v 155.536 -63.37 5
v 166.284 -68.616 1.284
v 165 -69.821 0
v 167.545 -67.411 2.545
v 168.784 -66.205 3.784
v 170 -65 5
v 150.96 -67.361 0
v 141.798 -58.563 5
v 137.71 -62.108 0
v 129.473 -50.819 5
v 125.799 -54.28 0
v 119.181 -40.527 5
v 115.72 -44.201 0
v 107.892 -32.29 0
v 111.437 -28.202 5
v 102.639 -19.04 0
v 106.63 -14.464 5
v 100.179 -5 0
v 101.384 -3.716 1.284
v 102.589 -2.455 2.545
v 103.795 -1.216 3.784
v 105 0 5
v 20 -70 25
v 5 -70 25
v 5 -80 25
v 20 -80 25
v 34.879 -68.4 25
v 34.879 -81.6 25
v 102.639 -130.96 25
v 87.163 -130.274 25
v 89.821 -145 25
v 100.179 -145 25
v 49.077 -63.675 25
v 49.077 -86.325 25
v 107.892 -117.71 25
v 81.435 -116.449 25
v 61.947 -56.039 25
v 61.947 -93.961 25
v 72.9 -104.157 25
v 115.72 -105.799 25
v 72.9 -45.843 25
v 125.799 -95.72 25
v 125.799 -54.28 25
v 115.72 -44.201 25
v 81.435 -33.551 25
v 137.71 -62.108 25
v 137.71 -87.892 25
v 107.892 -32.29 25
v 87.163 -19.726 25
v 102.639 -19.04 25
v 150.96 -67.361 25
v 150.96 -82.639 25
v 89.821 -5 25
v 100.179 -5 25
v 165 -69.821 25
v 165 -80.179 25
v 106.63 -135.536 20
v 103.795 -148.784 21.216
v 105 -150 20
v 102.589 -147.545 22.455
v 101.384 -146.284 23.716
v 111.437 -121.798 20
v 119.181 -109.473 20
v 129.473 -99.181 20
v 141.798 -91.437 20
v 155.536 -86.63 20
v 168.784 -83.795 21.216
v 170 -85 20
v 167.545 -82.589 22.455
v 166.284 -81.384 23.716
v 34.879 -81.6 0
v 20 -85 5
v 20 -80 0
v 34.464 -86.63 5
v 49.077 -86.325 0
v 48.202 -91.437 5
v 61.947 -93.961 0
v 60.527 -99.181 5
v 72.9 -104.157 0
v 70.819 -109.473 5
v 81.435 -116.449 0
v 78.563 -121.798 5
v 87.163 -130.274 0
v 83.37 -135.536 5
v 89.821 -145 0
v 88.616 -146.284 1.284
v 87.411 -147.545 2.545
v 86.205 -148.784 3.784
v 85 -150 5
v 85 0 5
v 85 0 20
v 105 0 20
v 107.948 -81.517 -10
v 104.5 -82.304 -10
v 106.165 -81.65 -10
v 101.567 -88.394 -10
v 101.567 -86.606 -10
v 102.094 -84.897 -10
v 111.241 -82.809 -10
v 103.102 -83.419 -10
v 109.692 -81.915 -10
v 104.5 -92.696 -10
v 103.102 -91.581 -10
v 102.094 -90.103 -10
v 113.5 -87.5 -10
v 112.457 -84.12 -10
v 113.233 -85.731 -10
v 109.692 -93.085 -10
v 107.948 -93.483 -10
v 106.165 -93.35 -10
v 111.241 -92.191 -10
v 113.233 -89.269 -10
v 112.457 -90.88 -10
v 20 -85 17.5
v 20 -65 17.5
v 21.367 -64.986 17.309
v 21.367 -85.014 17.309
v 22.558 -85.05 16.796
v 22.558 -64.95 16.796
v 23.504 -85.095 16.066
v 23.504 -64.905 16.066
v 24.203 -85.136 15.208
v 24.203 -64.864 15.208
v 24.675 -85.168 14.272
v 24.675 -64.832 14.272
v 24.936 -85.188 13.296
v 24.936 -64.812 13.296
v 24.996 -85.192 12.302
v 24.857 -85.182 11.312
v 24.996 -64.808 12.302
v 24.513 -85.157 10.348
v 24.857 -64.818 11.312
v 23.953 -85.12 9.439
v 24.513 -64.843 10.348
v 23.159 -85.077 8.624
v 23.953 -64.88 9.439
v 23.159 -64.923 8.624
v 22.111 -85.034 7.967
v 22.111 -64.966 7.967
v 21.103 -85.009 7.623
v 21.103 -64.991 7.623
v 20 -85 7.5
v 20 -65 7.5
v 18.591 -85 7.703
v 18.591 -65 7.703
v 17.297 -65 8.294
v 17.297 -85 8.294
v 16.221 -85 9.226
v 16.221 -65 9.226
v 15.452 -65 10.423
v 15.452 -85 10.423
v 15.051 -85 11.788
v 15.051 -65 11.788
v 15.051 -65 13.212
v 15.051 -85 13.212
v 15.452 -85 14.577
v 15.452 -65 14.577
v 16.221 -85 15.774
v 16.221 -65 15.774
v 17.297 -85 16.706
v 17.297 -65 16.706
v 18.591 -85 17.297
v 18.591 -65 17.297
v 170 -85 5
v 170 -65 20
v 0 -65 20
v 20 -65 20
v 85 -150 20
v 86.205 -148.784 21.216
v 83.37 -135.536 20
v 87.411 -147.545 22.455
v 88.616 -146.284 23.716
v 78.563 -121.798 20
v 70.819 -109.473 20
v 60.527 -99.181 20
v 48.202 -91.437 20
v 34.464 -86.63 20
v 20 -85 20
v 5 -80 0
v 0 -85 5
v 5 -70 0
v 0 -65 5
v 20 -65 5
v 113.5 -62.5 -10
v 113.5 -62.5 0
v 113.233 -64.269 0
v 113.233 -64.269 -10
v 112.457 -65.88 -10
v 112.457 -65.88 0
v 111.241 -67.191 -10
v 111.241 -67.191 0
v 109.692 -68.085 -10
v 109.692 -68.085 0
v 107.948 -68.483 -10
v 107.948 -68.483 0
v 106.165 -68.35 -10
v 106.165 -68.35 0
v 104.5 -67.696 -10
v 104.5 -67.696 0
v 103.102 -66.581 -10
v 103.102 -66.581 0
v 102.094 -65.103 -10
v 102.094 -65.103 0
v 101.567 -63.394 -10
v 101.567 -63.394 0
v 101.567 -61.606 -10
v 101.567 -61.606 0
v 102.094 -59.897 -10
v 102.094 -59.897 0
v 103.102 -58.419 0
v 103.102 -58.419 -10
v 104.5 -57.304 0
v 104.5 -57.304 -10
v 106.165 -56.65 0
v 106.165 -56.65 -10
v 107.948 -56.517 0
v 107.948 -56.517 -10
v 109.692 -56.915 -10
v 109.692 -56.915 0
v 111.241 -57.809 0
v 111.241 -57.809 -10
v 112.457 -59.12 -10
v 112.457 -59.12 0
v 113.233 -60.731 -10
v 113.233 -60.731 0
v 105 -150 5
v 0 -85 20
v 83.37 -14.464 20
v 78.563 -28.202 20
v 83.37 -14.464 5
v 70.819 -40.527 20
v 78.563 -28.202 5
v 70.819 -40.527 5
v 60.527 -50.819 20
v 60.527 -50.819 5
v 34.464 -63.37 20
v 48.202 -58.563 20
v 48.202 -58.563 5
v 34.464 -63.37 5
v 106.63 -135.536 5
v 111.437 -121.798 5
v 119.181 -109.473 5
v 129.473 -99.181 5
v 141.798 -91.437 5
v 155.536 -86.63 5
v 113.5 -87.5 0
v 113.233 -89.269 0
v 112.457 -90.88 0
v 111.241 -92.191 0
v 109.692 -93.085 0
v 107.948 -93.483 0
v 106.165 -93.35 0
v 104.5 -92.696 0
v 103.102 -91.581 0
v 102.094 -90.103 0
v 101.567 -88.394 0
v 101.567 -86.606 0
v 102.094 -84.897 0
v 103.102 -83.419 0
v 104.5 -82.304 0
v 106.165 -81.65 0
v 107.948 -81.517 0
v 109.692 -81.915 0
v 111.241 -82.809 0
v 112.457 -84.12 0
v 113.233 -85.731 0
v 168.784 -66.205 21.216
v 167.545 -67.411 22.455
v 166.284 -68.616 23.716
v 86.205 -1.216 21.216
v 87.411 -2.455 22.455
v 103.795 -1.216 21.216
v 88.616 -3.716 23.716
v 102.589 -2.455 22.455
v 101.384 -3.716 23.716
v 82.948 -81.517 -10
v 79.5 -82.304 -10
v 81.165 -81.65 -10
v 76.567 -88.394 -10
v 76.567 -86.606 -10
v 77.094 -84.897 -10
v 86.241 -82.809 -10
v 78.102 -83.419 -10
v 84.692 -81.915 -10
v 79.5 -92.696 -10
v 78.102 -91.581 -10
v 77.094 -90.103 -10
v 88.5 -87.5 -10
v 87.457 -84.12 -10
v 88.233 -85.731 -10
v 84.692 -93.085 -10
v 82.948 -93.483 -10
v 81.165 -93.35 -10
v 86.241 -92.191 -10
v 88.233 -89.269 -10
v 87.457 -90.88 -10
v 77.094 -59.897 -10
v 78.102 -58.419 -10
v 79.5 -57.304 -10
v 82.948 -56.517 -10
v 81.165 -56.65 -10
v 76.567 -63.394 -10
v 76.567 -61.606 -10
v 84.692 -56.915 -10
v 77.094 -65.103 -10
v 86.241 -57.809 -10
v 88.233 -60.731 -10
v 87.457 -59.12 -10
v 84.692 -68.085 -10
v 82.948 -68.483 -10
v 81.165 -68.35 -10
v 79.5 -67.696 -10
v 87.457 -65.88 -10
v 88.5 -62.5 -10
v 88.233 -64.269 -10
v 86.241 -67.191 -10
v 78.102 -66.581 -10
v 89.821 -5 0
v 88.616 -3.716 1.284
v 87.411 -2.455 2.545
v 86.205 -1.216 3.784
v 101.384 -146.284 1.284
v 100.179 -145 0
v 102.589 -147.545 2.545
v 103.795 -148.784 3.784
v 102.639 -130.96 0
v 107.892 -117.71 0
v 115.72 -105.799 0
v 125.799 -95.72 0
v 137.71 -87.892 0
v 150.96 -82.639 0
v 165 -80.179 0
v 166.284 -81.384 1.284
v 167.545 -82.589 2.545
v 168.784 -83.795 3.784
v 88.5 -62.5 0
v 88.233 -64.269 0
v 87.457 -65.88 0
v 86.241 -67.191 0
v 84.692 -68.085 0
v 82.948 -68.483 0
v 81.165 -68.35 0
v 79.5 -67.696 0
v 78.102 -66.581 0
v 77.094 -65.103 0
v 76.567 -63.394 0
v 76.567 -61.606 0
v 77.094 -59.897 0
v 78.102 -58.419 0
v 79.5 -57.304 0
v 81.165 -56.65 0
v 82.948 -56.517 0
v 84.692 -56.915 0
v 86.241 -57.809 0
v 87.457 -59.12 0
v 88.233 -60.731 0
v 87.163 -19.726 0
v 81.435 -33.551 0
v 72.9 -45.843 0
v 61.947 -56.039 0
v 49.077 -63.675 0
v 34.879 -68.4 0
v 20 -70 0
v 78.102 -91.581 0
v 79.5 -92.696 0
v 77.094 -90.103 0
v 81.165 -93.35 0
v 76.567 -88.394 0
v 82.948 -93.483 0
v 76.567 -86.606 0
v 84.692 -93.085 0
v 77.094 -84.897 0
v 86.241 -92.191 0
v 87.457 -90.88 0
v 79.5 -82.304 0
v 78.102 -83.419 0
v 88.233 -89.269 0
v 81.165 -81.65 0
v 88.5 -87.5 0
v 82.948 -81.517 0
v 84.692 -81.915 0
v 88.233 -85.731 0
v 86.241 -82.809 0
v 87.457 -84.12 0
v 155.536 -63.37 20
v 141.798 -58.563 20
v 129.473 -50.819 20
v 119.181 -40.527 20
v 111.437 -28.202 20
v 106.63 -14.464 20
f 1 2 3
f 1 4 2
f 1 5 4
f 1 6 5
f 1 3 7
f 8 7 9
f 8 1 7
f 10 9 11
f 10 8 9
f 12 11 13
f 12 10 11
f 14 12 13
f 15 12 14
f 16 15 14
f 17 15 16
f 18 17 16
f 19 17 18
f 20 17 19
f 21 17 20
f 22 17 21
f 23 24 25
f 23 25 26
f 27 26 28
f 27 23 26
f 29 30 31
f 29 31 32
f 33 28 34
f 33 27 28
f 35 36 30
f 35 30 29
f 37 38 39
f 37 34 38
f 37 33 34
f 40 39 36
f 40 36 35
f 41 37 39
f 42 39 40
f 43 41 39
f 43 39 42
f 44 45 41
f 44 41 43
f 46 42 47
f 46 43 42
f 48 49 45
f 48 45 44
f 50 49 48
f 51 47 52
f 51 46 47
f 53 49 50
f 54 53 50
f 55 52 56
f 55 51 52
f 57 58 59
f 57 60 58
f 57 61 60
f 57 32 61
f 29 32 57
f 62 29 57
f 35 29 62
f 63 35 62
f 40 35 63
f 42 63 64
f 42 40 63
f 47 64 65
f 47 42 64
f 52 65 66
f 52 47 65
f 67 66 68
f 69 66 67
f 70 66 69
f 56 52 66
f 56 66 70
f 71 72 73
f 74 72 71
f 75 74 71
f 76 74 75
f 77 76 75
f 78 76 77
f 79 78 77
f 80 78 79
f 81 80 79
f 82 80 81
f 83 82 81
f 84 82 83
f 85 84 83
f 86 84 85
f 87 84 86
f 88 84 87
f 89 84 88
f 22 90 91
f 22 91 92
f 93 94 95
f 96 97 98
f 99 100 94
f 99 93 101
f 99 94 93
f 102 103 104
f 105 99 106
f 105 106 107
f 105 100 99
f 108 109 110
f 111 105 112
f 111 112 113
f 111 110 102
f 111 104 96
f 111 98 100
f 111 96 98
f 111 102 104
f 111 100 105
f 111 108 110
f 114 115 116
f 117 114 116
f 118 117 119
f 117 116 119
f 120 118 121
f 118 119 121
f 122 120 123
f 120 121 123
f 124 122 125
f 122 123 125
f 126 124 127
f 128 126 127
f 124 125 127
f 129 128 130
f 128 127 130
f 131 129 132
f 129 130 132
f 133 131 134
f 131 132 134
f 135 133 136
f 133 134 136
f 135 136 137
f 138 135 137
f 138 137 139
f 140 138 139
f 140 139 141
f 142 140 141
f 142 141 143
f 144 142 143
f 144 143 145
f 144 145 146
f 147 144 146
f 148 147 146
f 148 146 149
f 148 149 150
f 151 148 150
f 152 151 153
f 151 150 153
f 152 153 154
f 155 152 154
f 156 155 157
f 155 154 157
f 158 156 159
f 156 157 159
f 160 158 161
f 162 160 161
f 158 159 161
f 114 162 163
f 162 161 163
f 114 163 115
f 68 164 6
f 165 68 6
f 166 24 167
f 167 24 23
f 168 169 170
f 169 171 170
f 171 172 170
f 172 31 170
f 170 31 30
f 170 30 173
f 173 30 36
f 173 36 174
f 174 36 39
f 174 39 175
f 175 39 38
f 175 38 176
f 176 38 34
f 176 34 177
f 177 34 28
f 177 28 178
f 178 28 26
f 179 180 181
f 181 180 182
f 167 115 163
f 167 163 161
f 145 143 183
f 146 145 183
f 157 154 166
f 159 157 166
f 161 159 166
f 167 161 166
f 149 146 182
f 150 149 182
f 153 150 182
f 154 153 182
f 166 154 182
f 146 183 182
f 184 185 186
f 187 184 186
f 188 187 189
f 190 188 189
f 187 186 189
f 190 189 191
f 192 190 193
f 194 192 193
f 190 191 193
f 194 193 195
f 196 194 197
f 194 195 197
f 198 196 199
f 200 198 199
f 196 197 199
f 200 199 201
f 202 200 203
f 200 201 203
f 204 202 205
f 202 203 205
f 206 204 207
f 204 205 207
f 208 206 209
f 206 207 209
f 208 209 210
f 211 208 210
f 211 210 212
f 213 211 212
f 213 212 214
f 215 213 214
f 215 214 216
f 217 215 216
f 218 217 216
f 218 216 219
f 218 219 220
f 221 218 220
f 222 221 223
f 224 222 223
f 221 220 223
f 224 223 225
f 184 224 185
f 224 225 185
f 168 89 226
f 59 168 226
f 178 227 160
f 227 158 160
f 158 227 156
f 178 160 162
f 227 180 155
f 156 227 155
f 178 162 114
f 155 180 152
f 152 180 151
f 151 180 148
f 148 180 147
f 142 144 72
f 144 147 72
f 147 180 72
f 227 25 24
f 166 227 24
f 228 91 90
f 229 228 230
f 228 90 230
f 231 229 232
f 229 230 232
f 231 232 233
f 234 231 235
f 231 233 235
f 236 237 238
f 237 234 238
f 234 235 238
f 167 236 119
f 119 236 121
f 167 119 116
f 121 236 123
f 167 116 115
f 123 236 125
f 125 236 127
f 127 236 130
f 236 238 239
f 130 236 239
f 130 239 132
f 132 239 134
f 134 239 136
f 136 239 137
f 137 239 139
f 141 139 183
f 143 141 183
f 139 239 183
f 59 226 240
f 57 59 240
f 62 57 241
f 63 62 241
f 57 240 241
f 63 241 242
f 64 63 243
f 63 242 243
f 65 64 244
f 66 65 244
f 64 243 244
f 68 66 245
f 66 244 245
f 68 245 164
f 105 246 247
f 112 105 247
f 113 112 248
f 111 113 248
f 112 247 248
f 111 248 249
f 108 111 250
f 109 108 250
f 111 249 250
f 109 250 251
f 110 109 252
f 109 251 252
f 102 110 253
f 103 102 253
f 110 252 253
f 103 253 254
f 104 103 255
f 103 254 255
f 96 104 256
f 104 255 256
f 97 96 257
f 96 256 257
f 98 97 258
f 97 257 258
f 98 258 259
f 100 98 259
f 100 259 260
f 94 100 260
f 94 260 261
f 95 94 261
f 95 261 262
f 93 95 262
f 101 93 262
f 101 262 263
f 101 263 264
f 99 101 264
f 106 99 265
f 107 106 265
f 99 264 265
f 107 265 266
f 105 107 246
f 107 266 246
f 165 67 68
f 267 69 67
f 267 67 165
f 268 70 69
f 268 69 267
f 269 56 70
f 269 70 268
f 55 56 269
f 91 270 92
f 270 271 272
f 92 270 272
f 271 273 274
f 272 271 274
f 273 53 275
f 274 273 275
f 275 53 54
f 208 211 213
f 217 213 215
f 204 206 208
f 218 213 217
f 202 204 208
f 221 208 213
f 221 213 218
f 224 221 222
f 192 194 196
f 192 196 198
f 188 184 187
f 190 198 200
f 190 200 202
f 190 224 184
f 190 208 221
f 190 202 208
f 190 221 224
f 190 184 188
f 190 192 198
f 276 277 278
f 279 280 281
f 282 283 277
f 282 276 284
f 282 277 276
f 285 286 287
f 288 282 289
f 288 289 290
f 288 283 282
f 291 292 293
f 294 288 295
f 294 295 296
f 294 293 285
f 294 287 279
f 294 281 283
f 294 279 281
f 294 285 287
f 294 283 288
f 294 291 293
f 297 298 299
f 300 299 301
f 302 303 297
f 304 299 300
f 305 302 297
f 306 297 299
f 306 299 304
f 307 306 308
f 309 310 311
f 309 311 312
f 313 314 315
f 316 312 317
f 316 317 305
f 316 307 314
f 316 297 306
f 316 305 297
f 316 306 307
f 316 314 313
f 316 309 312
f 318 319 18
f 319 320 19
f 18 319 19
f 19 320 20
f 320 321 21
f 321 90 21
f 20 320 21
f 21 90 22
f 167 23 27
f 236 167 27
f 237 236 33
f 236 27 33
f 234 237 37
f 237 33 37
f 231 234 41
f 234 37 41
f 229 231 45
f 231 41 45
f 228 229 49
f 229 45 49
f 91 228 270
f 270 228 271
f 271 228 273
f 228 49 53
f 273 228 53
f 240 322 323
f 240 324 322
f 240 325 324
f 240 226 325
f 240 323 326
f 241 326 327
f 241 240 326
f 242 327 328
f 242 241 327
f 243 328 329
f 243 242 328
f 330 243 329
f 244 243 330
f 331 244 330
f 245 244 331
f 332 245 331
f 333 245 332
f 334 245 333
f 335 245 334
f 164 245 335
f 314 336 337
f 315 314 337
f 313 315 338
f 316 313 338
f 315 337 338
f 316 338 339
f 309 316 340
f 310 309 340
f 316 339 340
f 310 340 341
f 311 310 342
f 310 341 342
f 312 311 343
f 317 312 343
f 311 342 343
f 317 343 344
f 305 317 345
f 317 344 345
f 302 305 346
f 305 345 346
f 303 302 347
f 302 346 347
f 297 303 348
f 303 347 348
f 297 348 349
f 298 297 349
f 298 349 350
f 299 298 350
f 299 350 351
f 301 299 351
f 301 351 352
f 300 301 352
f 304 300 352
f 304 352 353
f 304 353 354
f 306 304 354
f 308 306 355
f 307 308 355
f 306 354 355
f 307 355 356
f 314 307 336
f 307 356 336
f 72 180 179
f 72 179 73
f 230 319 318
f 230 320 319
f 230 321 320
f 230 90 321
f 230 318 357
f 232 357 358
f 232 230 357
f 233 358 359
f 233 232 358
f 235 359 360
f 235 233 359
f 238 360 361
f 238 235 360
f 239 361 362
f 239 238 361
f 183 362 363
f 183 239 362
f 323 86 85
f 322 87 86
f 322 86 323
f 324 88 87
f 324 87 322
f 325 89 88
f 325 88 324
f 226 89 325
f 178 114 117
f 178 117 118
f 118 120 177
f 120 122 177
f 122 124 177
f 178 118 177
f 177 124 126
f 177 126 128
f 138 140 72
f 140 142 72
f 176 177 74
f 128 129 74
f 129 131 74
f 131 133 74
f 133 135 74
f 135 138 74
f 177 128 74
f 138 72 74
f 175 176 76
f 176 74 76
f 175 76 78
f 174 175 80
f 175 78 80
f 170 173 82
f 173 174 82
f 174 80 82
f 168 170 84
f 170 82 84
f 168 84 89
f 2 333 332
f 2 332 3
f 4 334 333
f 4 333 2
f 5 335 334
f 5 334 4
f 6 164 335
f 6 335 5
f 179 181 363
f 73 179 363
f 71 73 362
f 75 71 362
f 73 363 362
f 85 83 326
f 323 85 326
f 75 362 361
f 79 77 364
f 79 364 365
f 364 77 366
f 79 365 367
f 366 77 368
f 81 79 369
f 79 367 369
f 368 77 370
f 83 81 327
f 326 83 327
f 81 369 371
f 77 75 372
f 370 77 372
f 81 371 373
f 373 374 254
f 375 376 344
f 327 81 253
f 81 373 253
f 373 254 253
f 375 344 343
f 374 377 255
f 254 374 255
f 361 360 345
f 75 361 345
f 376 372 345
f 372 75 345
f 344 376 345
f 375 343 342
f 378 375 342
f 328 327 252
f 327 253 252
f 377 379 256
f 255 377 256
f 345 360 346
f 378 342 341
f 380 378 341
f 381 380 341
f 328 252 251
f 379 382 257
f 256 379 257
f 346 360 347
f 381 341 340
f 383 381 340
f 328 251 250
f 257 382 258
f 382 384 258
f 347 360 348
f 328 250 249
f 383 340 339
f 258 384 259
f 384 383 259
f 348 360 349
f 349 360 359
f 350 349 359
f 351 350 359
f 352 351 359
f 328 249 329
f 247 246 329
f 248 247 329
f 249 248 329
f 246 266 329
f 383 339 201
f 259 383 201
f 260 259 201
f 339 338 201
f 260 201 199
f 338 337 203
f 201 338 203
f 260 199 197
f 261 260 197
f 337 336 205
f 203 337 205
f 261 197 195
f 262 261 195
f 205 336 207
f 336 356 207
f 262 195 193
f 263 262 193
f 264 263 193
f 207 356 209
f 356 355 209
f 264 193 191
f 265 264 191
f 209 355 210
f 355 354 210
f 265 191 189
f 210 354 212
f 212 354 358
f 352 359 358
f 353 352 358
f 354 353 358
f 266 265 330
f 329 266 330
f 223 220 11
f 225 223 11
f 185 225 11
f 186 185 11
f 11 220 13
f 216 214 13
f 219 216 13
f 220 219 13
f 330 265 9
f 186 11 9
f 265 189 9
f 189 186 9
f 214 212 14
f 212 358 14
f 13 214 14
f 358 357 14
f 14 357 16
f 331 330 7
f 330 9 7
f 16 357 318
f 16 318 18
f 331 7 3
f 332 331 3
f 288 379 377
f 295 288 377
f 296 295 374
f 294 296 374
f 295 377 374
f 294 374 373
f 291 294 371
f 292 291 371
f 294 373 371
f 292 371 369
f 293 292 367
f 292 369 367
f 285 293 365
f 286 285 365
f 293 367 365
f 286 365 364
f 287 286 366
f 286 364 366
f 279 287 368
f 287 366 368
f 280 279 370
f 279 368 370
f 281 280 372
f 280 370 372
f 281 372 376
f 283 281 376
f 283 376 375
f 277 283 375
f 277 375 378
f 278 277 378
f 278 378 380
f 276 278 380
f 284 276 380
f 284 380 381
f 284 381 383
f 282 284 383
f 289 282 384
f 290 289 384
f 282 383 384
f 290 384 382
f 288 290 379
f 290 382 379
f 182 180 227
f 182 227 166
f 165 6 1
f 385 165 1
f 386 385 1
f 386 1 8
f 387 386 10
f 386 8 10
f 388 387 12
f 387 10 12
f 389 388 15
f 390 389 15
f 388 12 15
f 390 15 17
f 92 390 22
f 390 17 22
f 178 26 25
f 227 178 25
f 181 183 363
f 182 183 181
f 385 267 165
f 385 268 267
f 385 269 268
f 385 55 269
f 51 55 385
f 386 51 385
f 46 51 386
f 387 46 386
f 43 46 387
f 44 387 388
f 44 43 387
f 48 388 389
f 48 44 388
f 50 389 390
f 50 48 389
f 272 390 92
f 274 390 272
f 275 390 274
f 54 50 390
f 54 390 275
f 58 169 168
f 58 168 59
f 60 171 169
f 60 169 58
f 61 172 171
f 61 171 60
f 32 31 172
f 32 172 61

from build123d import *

# Parameters (mm, degrees)
SKETCH_1_W          = 170
SKETCH_1_H          = 150
EXTRUDE_1_DEPTH     = 25
CUT_EXTRUDE_1_DEPTH = 50
CHAMFER_2_SIZE      = 5
SKETCH_7_R          = 6
EXTRUDE_4_DEPTH     = 10
CHAMFER_4_SIZE      = 5
SKETCH_8_R          = 5
CUT_EXTRUDE_2_DEPTH = 229.089894559


with BuildPart() as part:
    # 草图1 → 凸台-拉伸1 (new body)
    with BuildSketch(Plane.XY):
        with Locations((85, -75)):
            Rectangle(SKETCH_1_W, SKETCH_1_H)
    extrude(amount=EXTRUDE_1_DEPTH)

    # 草图3 → 切除-拉伸1 (cut)
    with BuildSketch(Plane(origin=(0, 0, 0), x_dir=(-1, 0, 0), z_dir=(0, 0, -1))):
        with BuildLine():
            Line((-170, 0), (-105, 0))
            ThreePointArc((-105, 0), (-215.961940777, 45.961940777), (-170, -65))
            Line((-170, -65), (-170, 0))
        make_face()
        with BuildLine():
            ThreePointArc((-170, -65), (-124.038059223, -45.961940777), (-105, 0))
            Line((-105, 0), (-170, 0))
            Line((-170, 0), (-170, -65))
        make_face()
        with BuildLine():
            ThreePointArc((0, -61.846584384), (18.242646352, 52.559490104), (-85, 0))
            Line((-85, 0), (-20, 0))
            Line((-20, 0), (0, 0))
            Line((0, 0), (0, -61.846584384))
        make_face()
        with BuildLine():
            Line((-20, 0), (-85, 0))
            ThreePointArc((-85, 0), (-65.961940777, -45.961940777), (-20, -65))
            Line((-20, -65), (0, -65))
            Line((0, -65), (0, -61.846584384))
            Line((0, -61.846584384), (0, 0))
            Line((0, 0), (-20, 0))
        make_face()
        with BuildLine():
            Line((0, -150), (-85, -150))
            ThreePointArc((-85, -150), (18.242646352, -202.559490104), (0, -88.153415616))
            Line((0, -88.153415616), (0, -150))
        make_face()
        with BuildLine():
            Line((0, -88.153415616), (0, -85))
            Line((0, -85), (-20, -85))
            ThreePointArc((-20, -85), (-65.961940777, -104.038059223), (-85, -150))
            Line((-85, -150), (0, -150))
            Line((0, -150), (0, -88.153415616))
        make_face()
        with BuildLine():
            Line((-170, -150), (-170, -85))
            ThreePointArc((-170, -85), (-215.961940777, -195.961940777), (-105, -150))
            Line((-105, -150), (-170, -150))
        make_face()
        with BuildLine():
            ThreePointArc((-105, -150), (-124.038059223, -104.038059223), (-170, -85))
            Line((-170, -85), (-170, -150))
            Line((-170, -150), (-105, -150))
        make_face()
    extrude(amount=-CUT_EXTRUDE_1_DEPTH, mode=Mode.SUBTRACT)

    # 倒角2
    chamfer_2_edges = [part.edges().sort_by_distance(p)[0] for p in [
        (0, -75, 0),
        (95, 0, 0),
        (170, -75, 0),
        (95, -150, 0),
        (124.038059223, -45.961940777, 0),
        (65.961940777, -45.961940777, 0),
        (124.038059223, -104.038059223, 0),
        (65.961940777, -104.038059223, 0),
        (10, -85, 0),
        (10, -65, 0),
    ]]
    chamfer(chamfer_2_edges, length=CHAMFER_2_SIZE)

    # 草图7 → 凸台-拉伸4 (add)
    with BuildSketch(Plane(origin=(0, 0, 0), x_dir=(-1, 0, 0), z_dir=(0, 0, -1))):
        with Locations(Location((-107.5, -62.5, 0), (0, 0, 180))):
            Circle(SKETCH_7_R)
        with Locations(Location((-82.5, -62.5, 0), (0, 0, 180))):
            Circle(SKETCH_7_R)
        with Locations(Location((-82.5, -87.5, 0), (0, 0, 180))):
            Circle(SKETCH_7_R)
        with Locations(Location((-107.5, -87.5, 0), (0, 0, 180))):
            Circle(SKETCH_7_R)
    extrude(amount=EXTRUDE_4_DEPTH)

    # 倒角4
    chamfer_4_edges = [part.edges().sort_by_distance(p)[0] for p in [
        (0, -75, 25),
        (95, -150, 25),
        (170, -75, 25),
        (95, 0, 25),
        (124.038059223, -104.038059223, 25),
        (10, -85, 25),
        (65.961940777, -104.038059223, 25),
        (10, -65, 25),
        (65.961940777, -45.961940777, 25),
        (124.038059223, -45.961940777, 25),
    ]]
    chamfer(chamfer_4_edges, length=CHAMFER_4_SIZE)

    # 草图8 → 切除-拉伸2 (cut, through all)
    with BuildSketch(Plane(origin=(0, 0, 0), x_dir=(1, 0, 0), z_dir=(0, 1, 0))):
        with Locations(Location((20, -12.5, 0), (0, 0, 270))):
            Circle(SKETCH_8_R)
    extrude(amount=-CUT_EXTRUDE_2_DEPTH, mode=Mode.SUBTRACT)


solid = part.part
